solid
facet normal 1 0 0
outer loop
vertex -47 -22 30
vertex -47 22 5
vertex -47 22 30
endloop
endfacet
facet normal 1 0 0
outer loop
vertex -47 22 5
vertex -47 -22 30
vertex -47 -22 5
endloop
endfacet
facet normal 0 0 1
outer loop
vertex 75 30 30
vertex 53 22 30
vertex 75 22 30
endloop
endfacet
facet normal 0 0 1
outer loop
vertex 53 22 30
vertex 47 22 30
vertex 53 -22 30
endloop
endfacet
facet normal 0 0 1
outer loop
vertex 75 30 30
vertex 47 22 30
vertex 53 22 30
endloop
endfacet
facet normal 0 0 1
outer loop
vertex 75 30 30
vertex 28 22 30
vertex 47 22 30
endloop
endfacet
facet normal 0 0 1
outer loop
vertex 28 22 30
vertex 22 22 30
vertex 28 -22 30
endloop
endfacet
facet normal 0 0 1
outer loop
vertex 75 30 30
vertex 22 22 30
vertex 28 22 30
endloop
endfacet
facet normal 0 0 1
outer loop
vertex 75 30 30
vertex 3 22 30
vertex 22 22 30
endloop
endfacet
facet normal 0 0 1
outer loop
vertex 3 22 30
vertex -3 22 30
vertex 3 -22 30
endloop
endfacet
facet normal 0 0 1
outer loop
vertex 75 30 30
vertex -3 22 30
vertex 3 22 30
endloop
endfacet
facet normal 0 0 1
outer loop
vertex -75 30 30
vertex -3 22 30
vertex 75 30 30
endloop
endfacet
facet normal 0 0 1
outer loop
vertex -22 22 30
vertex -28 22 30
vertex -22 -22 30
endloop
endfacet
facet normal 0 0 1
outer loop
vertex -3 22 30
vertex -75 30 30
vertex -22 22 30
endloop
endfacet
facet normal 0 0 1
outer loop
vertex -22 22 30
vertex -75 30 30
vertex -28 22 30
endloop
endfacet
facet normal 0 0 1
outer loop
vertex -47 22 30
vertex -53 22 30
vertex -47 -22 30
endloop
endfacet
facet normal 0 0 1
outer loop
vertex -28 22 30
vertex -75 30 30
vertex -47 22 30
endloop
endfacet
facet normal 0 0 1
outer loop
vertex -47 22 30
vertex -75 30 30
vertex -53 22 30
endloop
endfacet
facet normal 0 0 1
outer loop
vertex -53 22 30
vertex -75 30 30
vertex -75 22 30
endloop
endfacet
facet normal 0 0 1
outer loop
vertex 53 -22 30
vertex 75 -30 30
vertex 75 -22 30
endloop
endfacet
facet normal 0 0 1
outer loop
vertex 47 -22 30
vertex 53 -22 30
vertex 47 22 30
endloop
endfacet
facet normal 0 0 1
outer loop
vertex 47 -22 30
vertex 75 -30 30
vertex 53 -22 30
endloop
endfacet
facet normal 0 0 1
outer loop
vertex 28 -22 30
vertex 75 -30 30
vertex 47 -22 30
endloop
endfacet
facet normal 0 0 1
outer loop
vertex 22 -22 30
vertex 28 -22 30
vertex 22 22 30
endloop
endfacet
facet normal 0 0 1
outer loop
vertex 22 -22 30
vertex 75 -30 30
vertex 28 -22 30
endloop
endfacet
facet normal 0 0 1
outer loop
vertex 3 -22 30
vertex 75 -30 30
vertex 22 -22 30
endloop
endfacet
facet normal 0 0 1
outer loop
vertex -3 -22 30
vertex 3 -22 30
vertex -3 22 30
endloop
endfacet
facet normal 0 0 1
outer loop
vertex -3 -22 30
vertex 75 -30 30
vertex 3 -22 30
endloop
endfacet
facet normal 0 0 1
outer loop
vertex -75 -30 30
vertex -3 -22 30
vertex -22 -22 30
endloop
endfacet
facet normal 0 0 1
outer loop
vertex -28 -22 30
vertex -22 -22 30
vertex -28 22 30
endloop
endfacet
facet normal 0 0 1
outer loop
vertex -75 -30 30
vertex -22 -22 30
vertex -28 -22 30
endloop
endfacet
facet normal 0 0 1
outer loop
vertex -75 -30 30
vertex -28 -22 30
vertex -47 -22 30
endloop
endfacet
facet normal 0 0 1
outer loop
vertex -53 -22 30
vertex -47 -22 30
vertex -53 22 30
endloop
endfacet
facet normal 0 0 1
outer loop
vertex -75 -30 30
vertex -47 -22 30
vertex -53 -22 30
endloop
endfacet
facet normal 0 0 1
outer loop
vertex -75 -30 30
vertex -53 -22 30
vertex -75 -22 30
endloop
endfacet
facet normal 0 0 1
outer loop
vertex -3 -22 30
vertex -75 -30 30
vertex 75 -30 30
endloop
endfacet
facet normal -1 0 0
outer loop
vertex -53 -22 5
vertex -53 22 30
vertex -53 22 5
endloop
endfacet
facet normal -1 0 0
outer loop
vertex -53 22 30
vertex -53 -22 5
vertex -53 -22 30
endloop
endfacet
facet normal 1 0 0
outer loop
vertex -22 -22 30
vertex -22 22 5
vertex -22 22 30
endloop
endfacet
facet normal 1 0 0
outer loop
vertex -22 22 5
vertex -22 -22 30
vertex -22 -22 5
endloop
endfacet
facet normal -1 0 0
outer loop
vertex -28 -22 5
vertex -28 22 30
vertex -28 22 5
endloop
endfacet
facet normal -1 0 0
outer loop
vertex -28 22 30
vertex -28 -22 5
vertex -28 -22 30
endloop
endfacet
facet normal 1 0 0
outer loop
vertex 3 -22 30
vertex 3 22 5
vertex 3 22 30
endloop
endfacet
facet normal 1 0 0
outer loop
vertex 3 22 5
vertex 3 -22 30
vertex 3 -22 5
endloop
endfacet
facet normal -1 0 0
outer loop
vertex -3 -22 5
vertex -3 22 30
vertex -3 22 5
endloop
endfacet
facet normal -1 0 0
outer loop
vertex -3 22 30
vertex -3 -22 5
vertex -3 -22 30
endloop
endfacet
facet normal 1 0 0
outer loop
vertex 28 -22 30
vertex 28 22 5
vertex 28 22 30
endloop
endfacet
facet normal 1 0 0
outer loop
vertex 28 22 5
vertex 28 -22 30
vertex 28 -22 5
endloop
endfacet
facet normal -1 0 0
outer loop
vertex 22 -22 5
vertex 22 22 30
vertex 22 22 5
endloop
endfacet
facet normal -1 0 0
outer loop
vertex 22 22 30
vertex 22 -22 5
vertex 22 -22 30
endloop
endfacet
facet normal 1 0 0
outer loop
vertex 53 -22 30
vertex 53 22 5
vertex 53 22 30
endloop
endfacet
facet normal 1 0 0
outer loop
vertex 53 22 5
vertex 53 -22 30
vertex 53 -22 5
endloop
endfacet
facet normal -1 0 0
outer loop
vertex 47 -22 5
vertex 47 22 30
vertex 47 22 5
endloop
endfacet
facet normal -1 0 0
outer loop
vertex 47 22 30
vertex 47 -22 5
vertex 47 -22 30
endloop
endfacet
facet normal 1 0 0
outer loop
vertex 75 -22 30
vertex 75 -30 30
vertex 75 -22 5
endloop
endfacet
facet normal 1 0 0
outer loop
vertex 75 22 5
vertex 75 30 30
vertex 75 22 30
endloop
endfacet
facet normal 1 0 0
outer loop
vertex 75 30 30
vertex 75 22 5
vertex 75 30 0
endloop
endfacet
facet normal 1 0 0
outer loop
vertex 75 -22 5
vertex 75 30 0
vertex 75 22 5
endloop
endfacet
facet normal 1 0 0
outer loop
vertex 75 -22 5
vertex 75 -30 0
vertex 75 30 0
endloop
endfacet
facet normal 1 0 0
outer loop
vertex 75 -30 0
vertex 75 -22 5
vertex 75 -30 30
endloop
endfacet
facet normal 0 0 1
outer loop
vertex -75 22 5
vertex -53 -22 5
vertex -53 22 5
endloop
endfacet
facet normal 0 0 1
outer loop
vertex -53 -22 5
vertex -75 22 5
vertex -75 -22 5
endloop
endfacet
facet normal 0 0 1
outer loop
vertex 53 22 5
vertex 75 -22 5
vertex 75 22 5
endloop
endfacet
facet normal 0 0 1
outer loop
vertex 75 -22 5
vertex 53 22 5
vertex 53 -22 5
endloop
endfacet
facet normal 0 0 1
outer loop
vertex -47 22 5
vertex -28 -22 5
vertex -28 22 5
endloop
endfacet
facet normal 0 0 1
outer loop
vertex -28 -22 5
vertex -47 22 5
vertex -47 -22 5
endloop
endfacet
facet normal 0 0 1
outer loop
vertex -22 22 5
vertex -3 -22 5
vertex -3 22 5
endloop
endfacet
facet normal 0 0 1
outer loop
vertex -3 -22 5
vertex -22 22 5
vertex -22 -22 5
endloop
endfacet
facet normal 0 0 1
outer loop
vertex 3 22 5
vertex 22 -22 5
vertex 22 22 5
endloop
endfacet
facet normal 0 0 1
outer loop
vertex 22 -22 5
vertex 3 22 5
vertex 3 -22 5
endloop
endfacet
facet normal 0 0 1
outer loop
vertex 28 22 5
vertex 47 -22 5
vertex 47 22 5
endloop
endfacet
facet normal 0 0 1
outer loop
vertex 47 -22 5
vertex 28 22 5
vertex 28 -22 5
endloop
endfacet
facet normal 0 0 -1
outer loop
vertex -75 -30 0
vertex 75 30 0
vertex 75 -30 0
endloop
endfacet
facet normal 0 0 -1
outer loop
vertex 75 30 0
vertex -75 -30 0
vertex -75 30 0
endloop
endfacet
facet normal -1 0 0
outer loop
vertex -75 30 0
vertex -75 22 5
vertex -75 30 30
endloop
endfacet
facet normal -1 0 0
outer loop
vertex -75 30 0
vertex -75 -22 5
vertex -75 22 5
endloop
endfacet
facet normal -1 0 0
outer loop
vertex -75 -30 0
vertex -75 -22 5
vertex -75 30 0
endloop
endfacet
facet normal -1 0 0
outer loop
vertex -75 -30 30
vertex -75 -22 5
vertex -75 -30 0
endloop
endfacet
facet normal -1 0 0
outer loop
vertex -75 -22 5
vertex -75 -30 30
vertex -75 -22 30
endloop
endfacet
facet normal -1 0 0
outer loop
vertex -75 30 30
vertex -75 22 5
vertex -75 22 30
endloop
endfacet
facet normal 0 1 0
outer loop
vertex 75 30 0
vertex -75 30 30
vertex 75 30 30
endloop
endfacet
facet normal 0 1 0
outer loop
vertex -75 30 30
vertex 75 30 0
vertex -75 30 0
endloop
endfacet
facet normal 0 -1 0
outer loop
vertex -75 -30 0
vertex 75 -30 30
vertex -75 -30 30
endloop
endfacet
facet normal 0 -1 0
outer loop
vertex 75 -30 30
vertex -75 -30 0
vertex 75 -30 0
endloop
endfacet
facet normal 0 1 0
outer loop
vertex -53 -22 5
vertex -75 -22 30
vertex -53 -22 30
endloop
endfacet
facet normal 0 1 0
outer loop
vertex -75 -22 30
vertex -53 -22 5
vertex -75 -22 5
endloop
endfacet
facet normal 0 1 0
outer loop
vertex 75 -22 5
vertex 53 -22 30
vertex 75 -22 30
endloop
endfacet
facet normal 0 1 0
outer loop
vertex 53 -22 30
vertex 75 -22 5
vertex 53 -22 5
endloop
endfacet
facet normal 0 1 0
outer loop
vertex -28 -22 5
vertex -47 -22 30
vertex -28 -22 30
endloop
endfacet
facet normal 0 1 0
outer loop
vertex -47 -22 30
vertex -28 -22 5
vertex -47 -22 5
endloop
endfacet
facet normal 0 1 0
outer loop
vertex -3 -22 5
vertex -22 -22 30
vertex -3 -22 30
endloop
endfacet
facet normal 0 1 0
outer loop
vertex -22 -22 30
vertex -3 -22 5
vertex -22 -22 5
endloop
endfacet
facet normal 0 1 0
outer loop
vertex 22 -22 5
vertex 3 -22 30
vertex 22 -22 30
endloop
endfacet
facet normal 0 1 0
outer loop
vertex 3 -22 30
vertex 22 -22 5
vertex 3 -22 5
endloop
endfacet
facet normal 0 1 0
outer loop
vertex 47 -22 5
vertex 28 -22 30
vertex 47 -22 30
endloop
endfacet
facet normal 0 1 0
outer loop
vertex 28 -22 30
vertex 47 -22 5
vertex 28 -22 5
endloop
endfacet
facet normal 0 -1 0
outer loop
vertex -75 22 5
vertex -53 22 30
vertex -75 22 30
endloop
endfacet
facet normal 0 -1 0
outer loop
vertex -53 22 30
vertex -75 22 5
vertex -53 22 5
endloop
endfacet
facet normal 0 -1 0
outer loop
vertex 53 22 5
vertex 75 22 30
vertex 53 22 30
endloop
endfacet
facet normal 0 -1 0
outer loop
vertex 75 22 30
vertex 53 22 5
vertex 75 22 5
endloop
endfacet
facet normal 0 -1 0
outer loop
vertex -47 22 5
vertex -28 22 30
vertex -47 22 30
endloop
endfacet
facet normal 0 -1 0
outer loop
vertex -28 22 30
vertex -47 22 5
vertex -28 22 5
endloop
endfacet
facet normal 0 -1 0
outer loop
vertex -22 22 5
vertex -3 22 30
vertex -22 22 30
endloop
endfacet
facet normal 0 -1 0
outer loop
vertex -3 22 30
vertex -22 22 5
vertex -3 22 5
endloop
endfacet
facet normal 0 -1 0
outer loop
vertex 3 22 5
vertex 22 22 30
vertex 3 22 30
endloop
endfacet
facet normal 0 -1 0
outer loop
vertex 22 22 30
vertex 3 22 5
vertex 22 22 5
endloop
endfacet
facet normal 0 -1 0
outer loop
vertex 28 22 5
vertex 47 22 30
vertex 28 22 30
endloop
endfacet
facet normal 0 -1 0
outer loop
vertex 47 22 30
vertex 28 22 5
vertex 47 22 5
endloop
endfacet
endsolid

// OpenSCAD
$fn = 32;

// ----------------------------------------------------------------------
// Rib frame 150 x 60 x 30
// 5 ribs at 25 mm pitch
// ----------------------------------------------------------------------

// --- parameters (mm) ---
frame = [150, 60, 5];  // base plate size (x, y, z)
rail_w = 8;            // side rail width
ribs = 5;              // number of ribs
rib_t = 6;             // rib thickness
rib_h = 25;            // rib height above the base plate
pitch = 25;            // pitch between rib centres

// --- derived feature positions (mm) ---
span = (ribs - 1) * pitch;          // = 100   distance between the outer ribs
origin_x = -span / 2;               // = -50   X of the first rib
rib_len = frame[1] - 2 * rail_w + 2;  // = 46   rib length, 1 mm into each rail
feature_centers = [
  [origin_x + 0 * pitch, 0],
  [origin_x + 1 * pitch, 0],
  [origin_x + 2 * pitch, 0],
  [origin_x + 3 * pitch, 0],
  [origin_x + 4 * pitch, 0]
];   // rib centre line, drives the rib loop

// base plate, two side rails, then the ribs read straight off feature_centers
union() {
  translate([-frame[0] / 2, -frame[1] / 2, 0]) cube(frame);
  translate([-frame[0] / 2, -frame[1] / 2, 0]) cube([frame[0], rail_w, frame[2] + rib_h]);
  translate([-frame[0] / 2, frame[1] / 2 - rail_w, 0]) cube([frame[0], rail_w, frame[2] + rib_h]);
  for (centre = feature_centers)
    translate([centre[0] - rib_t / 2, centre[1] - rib_len / 2, frame[2] - 1])
      cube([rib_t, rib_len, rib_h + 1]);
}
